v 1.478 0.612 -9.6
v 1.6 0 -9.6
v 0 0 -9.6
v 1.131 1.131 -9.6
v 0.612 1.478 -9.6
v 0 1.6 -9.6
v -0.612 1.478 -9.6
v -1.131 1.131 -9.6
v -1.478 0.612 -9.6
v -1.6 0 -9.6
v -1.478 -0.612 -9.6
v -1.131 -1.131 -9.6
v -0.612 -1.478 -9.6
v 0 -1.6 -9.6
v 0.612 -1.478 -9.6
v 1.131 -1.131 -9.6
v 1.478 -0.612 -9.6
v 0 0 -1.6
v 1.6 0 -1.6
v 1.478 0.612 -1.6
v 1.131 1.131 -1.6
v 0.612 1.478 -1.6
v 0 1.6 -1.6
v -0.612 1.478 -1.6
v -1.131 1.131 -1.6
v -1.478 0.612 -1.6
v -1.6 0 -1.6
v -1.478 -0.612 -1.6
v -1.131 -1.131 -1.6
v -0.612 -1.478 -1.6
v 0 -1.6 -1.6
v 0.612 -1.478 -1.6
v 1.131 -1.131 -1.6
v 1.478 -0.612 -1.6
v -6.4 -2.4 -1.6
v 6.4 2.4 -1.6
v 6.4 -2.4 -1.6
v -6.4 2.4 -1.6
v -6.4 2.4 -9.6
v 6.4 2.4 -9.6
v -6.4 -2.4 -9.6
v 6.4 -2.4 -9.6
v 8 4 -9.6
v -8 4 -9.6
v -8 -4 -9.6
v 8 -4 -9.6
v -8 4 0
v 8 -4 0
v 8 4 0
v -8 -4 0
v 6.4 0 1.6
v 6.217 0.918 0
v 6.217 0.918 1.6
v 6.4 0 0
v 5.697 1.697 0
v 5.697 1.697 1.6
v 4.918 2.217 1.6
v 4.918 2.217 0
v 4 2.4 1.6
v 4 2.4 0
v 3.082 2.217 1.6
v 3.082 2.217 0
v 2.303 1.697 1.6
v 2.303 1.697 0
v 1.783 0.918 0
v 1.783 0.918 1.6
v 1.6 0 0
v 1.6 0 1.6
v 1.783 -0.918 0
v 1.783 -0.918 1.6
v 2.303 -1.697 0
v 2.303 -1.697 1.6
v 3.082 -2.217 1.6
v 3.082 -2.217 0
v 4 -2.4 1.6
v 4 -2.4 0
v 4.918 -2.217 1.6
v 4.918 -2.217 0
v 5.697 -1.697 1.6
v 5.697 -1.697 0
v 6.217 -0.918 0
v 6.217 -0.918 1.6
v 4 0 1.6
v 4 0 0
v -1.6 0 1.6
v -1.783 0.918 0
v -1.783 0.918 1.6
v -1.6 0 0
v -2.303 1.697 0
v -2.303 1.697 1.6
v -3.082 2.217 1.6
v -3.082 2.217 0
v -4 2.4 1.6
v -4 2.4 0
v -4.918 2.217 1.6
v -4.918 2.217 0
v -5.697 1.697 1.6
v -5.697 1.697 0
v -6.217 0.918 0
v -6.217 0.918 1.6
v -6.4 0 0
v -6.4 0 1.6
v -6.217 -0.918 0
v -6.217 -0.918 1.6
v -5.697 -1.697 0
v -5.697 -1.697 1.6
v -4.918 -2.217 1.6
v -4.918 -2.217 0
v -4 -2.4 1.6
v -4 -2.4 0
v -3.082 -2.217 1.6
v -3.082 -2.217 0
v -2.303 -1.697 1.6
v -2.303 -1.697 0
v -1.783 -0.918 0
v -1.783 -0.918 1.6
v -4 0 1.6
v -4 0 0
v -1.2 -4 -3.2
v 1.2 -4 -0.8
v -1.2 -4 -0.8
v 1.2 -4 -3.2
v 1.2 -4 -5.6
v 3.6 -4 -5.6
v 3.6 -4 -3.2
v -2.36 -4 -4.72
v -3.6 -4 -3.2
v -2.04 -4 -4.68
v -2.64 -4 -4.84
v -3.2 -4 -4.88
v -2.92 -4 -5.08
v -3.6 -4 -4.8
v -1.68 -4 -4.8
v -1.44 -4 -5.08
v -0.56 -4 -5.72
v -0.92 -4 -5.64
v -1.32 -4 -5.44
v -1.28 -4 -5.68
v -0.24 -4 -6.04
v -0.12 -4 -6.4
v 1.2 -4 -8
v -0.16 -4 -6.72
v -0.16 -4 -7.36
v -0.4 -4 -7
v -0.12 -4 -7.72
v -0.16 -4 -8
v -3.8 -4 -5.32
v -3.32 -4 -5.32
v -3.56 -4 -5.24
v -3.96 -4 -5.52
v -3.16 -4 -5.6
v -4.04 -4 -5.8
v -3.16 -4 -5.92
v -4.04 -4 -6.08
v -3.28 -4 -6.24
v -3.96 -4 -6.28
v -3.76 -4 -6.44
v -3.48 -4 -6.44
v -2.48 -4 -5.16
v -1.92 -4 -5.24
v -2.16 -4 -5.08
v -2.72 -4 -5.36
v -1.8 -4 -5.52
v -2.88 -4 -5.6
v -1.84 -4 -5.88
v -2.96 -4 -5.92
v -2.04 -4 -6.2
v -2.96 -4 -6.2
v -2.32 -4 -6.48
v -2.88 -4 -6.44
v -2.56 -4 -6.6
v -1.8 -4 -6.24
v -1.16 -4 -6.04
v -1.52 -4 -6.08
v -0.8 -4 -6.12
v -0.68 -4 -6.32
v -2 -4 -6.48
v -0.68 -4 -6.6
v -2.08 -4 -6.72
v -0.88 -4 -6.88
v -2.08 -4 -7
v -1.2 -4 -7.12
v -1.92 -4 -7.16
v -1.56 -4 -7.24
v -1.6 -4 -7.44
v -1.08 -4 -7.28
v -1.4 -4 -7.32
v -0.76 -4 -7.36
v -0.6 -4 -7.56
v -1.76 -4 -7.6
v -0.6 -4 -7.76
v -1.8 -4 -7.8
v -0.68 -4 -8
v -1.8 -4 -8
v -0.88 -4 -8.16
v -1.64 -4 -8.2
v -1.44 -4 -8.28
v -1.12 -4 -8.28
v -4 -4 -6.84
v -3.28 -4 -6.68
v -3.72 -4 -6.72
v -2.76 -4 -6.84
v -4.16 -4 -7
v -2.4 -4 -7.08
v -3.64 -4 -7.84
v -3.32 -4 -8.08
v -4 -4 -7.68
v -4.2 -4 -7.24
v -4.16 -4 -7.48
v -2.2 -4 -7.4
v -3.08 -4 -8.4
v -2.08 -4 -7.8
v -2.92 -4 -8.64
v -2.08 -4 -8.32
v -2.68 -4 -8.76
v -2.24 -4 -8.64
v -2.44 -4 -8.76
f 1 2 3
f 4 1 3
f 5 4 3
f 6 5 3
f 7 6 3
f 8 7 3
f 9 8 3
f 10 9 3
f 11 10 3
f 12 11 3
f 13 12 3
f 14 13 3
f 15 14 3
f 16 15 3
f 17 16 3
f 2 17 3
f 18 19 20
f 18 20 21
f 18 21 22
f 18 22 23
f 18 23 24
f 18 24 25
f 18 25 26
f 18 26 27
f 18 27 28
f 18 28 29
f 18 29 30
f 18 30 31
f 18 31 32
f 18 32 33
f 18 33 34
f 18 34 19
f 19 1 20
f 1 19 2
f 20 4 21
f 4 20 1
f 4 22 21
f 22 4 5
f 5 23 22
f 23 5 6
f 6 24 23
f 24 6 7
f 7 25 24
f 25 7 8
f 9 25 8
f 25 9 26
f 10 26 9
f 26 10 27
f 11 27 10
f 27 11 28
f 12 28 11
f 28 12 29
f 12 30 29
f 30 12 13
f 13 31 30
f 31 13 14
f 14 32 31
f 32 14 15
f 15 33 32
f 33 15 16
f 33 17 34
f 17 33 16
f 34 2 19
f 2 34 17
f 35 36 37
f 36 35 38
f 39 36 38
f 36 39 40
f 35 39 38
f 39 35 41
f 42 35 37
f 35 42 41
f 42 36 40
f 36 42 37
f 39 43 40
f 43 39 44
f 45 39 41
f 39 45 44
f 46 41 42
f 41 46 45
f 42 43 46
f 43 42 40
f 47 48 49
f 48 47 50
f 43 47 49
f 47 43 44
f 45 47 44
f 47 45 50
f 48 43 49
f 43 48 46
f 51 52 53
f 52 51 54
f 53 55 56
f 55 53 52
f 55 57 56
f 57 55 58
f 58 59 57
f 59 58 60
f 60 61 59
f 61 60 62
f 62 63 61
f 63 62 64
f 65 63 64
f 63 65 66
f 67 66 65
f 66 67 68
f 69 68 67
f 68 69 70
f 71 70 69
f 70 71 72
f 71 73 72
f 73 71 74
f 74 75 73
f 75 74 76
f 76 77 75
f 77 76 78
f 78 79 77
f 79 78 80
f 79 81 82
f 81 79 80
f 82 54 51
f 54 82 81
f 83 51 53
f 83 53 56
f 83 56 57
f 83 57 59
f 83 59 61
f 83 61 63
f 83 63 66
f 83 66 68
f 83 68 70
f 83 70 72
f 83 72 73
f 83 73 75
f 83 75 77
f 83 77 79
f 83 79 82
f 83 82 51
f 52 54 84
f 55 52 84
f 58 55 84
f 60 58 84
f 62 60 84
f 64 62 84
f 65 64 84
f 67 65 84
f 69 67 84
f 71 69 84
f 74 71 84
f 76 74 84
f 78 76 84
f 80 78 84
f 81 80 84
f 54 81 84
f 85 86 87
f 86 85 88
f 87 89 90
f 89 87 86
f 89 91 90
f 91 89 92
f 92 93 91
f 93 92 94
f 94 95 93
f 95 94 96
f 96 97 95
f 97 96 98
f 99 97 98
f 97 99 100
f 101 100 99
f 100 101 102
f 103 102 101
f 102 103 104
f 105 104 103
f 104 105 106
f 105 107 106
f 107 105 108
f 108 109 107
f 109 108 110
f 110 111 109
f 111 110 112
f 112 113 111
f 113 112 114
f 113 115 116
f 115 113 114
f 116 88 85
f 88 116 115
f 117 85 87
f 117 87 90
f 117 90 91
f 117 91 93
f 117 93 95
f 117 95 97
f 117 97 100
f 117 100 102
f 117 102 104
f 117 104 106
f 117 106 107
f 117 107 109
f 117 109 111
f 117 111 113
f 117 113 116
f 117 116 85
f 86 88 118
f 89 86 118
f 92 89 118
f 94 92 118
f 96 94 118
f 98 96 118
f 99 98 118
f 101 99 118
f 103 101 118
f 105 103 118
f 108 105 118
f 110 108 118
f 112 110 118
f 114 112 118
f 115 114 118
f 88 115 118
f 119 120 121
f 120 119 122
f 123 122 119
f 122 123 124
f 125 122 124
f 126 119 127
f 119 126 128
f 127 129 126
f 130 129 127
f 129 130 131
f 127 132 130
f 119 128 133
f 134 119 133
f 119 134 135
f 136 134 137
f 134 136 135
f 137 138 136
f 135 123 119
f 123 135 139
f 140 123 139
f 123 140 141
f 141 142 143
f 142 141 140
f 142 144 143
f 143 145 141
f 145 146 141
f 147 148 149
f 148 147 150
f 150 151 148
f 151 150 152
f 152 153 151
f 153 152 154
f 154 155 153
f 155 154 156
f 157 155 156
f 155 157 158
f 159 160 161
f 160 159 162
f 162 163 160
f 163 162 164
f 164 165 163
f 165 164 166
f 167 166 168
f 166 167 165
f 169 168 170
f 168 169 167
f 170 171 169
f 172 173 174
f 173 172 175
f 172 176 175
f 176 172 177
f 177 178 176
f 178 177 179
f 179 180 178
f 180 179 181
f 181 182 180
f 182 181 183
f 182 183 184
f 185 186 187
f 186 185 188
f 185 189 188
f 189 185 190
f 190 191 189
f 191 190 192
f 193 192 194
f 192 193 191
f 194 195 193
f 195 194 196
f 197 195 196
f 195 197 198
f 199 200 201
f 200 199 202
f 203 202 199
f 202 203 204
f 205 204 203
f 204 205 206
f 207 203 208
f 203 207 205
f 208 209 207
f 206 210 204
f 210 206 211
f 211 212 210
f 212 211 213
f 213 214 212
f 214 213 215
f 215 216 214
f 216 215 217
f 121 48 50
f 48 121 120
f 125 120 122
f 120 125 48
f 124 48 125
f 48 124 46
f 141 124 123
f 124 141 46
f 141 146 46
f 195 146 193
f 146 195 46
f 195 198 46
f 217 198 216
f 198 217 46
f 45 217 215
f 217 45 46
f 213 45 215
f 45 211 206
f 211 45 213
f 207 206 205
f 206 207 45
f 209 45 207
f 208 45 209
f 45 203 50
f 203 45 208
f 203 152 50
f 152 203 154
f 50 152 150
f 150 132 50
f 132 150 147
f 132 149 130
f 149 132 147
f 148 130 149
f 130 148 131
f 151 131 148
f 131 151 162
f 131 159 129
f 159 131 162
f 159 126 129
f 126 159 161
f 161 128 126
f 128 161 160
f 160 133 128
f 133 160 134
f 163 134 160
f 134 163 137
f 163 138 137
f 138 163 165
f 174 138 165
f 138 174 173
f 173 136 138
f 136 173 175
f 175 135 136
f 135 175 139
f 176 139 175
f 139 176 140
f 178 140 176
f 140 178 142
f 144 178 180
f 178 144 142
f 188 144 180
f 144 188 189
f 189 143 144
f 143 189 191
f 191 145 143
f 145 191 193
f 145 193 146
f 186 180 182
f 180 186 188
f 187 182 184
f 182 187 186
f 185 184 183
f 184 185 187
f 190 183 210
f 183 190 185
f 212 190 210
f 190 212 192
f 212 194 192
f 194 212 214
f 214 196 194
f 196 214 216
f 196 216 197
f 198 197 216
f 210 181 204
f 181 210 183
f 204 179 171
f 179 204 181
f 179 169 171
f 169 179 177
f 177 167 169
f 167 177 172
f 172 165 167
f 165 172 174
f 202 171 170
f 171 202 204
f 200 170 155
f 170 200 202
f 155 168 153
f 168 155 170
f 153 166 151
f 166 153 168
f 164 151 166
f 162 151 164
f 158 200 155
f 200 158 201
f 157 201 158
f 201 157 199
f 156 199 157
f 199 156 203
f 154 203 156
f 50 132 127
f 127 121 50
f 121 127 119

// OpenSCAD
// file: ../p/4-4edge.scad
use <../lib.scad>
function ldraw_lib__4_4edge() = [
// 0 Circle 1.0
// 0 Name: 4-4edge.dat
// 0 Author: James Jessiman
// 0 !LDRAW_ORG Primitive UPDATE 2017-01
// 0 !LICENSE Licensed under CC BY 2.0 and CC BY 4.0 : see CAreadme.txt
// 
// 0 BFC CERTIFY CCW
  [0,"BFC","CERTIFY"],
  [0,"BFC","CCW"],
// 
// 0 !HISTORY 1998-12-15 [PTadmin] Official Update 1998-10
// 0 !HISTORY 2005-12-28 [PTadmin] Official Update 2005-01
// 0 !HISTORY 2007-06-24 [PTadmin] Header formatted for Contributor Agreement
// 0 !HISTORY 2008-07-01 [PTadmin] Official Update 2008-01
// 0 !HISTORY 2017-01-15 [Steffen] BFCed
// 0 !HISTORY 2017-12-30 [PTadmin] Official Update 2017-01
// 
// 
// 2 24 1 0 0 0.9239 0 0.3827
  [2,24,1,0,0,0.9239,0,0.3827],
// 2 24 0.9239 0 0.3827 0.7071 0 0.7071
  [2,24,0.9239,0,0.3827,0.7071,0,0.7071],
// 2 24 0.7071 0 0.7071 0.3827 0 0.9239
  [2,24,0.7071,0,0.7071,0.3827,0,0.9239],
// 2 24 0.3827 0 0.9239 0 0 1
  [2,24,0.3827,0,0.9239,0,0,1],
// 2 24 0 0 1 -0.3827 0 0.9239
  [2,24,0,0,1,-0.3827,0,0.9239],
// 2 24 -0.3827 0 0.9239 -0.7071 0 0.7071
  [2,24,-0.3827,0,0.9239,-0.7071,0,0.7071],
// 2 24 -0.7071 0 0.7071 -0.9239 0 0.3827
  [2,24,-0.7071,0,0.7071,-0.9239,0,0.3827],
// 2 24 -0.9239 0 0.3827 -1 0 -0
  [2,24,-0.9239,0,0.3827,-1,0,-0],
// 2 24 -1 0 -0 -0.9239 0 -0.3827
  [2,24,-1,0,-0,-0.9239,0,-0.3827],
// 2 24 -0.9239 0 -0.3827 -0.7071 0 -0.7071
  [2,24,-0.9239,0,-0.3827,-0.7071,0,-0.7071],
// 2 24 -0.7071 0 -0.7071 -0.3827 0 -0.9239
  [2,24,-0.7071,0,-0.7071,-0.3827,0,-0.9239],
// 2 24 -0.3827 0 -0.9239 0 0 -1
  [2,24,-0.3827,0,-0.9239,0,0,-1],
// 2 24 0 0 -1 0.3827 0 -0.9239
  [2,24,0,0,-1,0.3827,0,-0.9239],
// 2 24 0.3827 0 -0.9239 0.7071 0 -0.7071
  [2,24,0.3827,0,-0.9239,0.7071,0,-0.7071],
// 2 24 0.7071 0 -0.7071 0.9239 0 -0.3827
  [2,24,0.7071,0,-0.7071,0.9239,0,-0.3827],
// 2 24 0.9239 0 -0.3827 1 0 0
  [2,24,0.9239,0,-0.3827,1,0,0],
];
module ldraw_lib__4_4edge(step=0, col=false, unit=2/5, alt=false, line=0.2, solid=!$preview)
    makepoly(ldraw_lib__4_4edge(), step=step, col=col, unit=unit, alt=alt, line=line, solid=solid);
ldraw_lib__4_4edge(line=0.2);
// file: ../p/4-4disc.scad
use <../lib.scad>
function ldraw_lib__4_4disc() = [
// 0 Disc 1.0
// 0 Name: 4-4disc.dat
// 0 Author: James Jessiman
// 0 !LDRAW_ORG Primitive UPDATE 2002-02
// 0 !LICENSE Licensed under CC BY 2.0 and CC BY 4.0 : see CAreadme.txt
// 
// 0 BFC CERTIFY CCW
  [0,"BFC","CERTIFY"],
  [0,"BFC","CCW"],
// 
// 0 !HISTORY 1998-12-15 [PTadmin] Official Update 1998-10
// 0 !HISTORY 2002-03-23 [sbliss] Added BFC statement
// 0 !HISTORY 2002-04-25 [PTadmin] Official Update 2002-02
// 0 !HISTORY 2007-06-24 [PTadmin] Header formatted for Contributor Agreement
// 0 !HISTORY 2008-07-01 [PTadmin] Official Update 2008-01
// 
// 
// 3 16 0 0 0 1 0 0 0.9239 0 0.3827
  [3,16,0,0,0,1,0,0,0.9239,0,0.3827],
// 3 16 0 0 0 0.9239 0 0.3827 0.7071 0 0.7071
  [3,16,0,0,0,0.9239,0,0.3827,0.7071,0,0.7071],
// 3 16 0 0 0 0.7071 0 0.7071 0.3827 0 0.9239
  [3,16,0,0,0,0.7071,0,0.7071,0.3827,0,0.9239],
// 3 16 0 0 0 0.3827 0 0.9239 0 0 1
  [3,16,0,0,0,0.3827,0,0.9239,0,0,1],
// 3 16 0 0 0 0 0 1 -0.3827 0 0.9239
  [3,16,0,0,0,0,0,1,-0.3827,0,0.9239],
// 3 16 0 0 0 -0.3827 0 0.9239 -0.7071 0 0.7071
  [3,16,0,0,0,-0.3827,0,0.9239,-0.7071,0,0.7071],
// 3 16 0 0 0 -0.7071 0 0.7071 -0.9239 0 0.3827
  [3,16,0,0,0,-0.7071,0,0.7071,-0.9239,0,0.3827],
// 3 16 0 0 0 -0.9239 0 0.3827 -1 0 -0
  [3,16,0,0,0,-0.9239,0,0.3827,-1,0,-0],
// 3 16 0 0 0 -1 0 -0 -0.9239 0 -0.3827
  [3,16,0,0,0,-1,0,-0,-0.9239,0,-0.3827],
// 3 16 0 0 0 -0.9239 0 -0.3827 -0.7071 0 -0.7071
  [3,16,0,0,0,-0.9239,0,-0.3827,-0.7071,0,-0.7071],
// 3 16 0 0 0 -0.7071 0 -0.7071 -0.3827 0 -0.9239
  [3,16,0,0,0,-0.7071,0,-0.7071,-0.3827,0,-0.9239],
// 3 16 0 0 0 -0.3827 0 -0.9239 0 0 -1
  [3,16,0,0,0,-0.3827,0,-0.9239,0,0,-1],
// 3 16 0 0 0 0 0 -1 0.3827 0 -0.9239
  [3,16,0,0,0,0,0,-1,0.3827,0,-0.9239],
// 3 16 0 0 0 0.3827 0 -0.9239 0.7071 0 -0.7071
  [3,16,0,0,0,0.3827,0,-0.9239,0.7071,0,-0.7071],
// 3 16 0 0 0 0.7071 0 -0.7071 0.9239 0 -0.3827
  [3,16,0,0,0,0.7071,0,-0.7071,0.9239,0,-0.3827],
// 3 16 0 0 0 0.9239 0 -0.3827 1 0 0
  [3,16,0,0,0,0.9239,0,-0.3827,1,0,0],
// 0
];
module ldraw_lib__4_4disc(step=0, col=false, unit=2/5, alt=false, line=0.2, solid=!$preview)
    makepoly(ldraw_lib__4_4disc(), step=step, col=col, unit=unit, alt=alt, line=line, solid=solid);
ldraw_lib__4_4disc(line=0.2);
// file: ../p/4-4cyli.scad
use <../lib.scad>
$fa=1; $fs=0.2;
function ldraw_lib__4_4cyli(realsolid=false) = [
// 0 Cylinder 1.0
// 0 Name: 4-4cyli.dat
// 0 Author: James Jessiman
// 0 !LDRAW_ORG Primitive UPDATE 2005-01
// 0 !LICENSE Licensed under CC BY 2.0 and CC BY 4.0 : see CAreadme.txt
// 
// 0 BFC CERTIFY CCW
  [0,"BFC","CERTIFY"],
  [0,"BFC","CCW"],
// 
// 0 !HISTORY 1998-12-15 [PTadmin] Official Update 1998-10
// 0 !HISTORY 2002-03-23 [sbliss] Added BFC statement; merged headers from files in distributions LDraw 0.27 and Complete.
// 0 !HISTORY 2002-04-25 [PTadmin] Official Update 2002-02
// 0 !HISTORY 2004-12-14 [guyvivan] BFC CCW
// 0 !HISTORY 2005-12-28 [PTadmin] Official Update 2005-01
// 0 !HISTORY 2007-06-24 [PTadmin] Header formatted for Contributor Agreement
// 0 !HISTORY 2008-07-01 [PTadmin] Official Update 2008-01
// 
// 
// 4 16 1 1 0 0.9239 1 0.3827 0.9239 0 0.3827 1 0 0
  [4,16,1,1,0,0.9239,1,0.3827,0.9239,0,0.3827,1,0,0],
// 5 24 1 0 0 1 1 0 0.9239 0 0.3827 0.9239 0 -0.3827
  [5,24,1,0,0,1,1,0,0.9239,0,0.3827,0.9239,0,-0.3827],
// 4 16 0.9239 1 0.3827 0.7071 1 0.7071 0.7071 0 0.7071 0.9239 0 0.3827
  [4,16,0.9239,1,0.3827,0.7071,1,0.7071,0.7071,0,0.7071,0.9239,0,0.3827],
// 5 24 0.9239 0 0.3827 0.9239 1 0.3827 0.7071 0 0.7071 1 0 0
  [5,24,0.9239,0,0.3827,0.9239,1,0.3827,0.7071,0,0.7071,1,0,0],
// 4 16 0.7071 1 0.7071 0.3827 1 0.9239 0.3827 0 0.9239 0.7071 0 0.7071
  [4,16,0.7071,1,0.7071,0.3827,1,0.9239,0.3827,0,0.9239,0.7071,0,0.7071],
// 5 24 0.7071 0 0.7071 0.7071 1 0.7071 0.3827 0 0.9239 0.9239 0 0.3827
  [5,24,0.7071,0,0.7071,0.7071,1,0.7071,0.3827,0,0.9239,0.9239,0,0.3827],
// 4 16 0.3827 1 0.9239 0 1 1 0 0 1 0.3827 0 0.9239
  [4,16,0.3827,1,0.9239,0,1,1,0,0,1,0.3827,0,0.9239],
// 5 24 0.3827 0 0.9239 0.3827 1 0.9239 0 0 1 0.7071 0 0.7071
  [5,24,0.3827,0,0.9239,0.3827,1,0.9239,0,0,1,0.7071,0,0.7071],
// 4 16 0 1 1 -0.3827 1 0.9239 -0.3827 0 0.9239 0 0 1
  [4,16,0,1,1,-0.3827,1,0.9239,-0.3827,0,0.9239,0,0,1],
// 5 24 0 0 1 0 1 1 -0.3827 0 0.9239 0.3827 0 0.9239
  [5,24,0,0,1,0,1,1,-0.3827,0,0.9239,0.3827,0,0.9239],
// 4 16 -0.3827 1 0.9239 -0.7071 1 0.7071 -0.7071 0 0.7071 -0.3827 0 0.9239
  [4,16,-0.3827,1,0.9239,-0.7071,1,0.7071,-0.7071,0,0.7071,-0.3827,0,0.9239],
// 5 24 -0.3827 0 0.9239 -0.3827 1 0.9239 -0.7071 0 0.7071 0 0 1
  [5,24,-0.3827,0,0.9239,-0.3827,1,0.9239,-0.7071,0,0.7071,0,0,1],
// 4 16 -0.7071 1 0.7071 -0.9239 1 0.3827 -0.9239 0 0.3827 -0.7071 0 0.7071
  [4,16,-0.7071,1,0.7071,-0.9239,1,0.3827,-0.9239,0,0.3827,-0.7071,0,0.7071],
// 5 24 -0.7071 0 0.7071 -0.7071 1 0.7071 -0.9239 0 0.3827 -0.3827 0 0.9239
  [5,24,-0.7071,0,0.7071,-0.7071,1,0.7071,-0.9239,0,0.3827,-0.3827,0,0.9239],
// 4 16 -0.9239 1 0.3827 -1 1 0 -1 0 0 -0.9239 0 0.3827
  [4,16,-0.9239,1,0.3827,-1,1,0,-1,0,0,-0.9239,0,0.3827],
// 5 24 -0.9239 0 0.3827 -0.9239 1 0.3827 -1 0 0 -0.7071 0 0.7071
  [5,24,-0.9239,0,0.3827,-0.9239,1,0.3827,-1,0,0,-0.7071,0,0.7071],
// 4 16 -1 1 0 -0.9239 1 -0.3827 -0.9239 0 -0.3827 -1 0 0
  [4,16,-1,1,0,-0.9239,1,-0.3827,-0.9239,0,-0.3827,-1,0,0],
// 5 24 -1 0 0 -1 1 0 -0.9239 0 -0.3827 -0.9239 0 0.3827
  [5,24,-1,0,0,-1,1,0,-0.9239,0,-0.3827,-0.9239,0,0.3827],
// 4 16 -0.9239 1 -0.3827 -0.7071 1 -0.7071 -0.7071 0 -0.7071 -0.9239 0 -0.3827
  [4,16,-0.9239,1,-0.3827,-0.7071,1,-0.7071,-0.7071,0,-0.7071,-0.9239,0,-0.3827],
// 5 24 -0.9239 0 -0.3827 -0.9239 1 -0.3827 -0.7071 0 -0.7071 -1 0 0
  [5,24,-0.9239,0,-0.3827,-0.9239,1,-0.3827,-0.7071,0,-0.7071,-1,0,0],
// 4 16 -0.7071 1 -0.7071 -0.3827 1 -0.9239 -0.3827 0 -0.9239 -0.7071 0 -0.7071
  [4,16,-0.7071,1,-0.7071,-0.3827,1,-0.9239,-0.3827,0,-0.9239,-0.7071,0,-0.7071],
// 5 24 -0.7071 0 -0.7071 -0.7071 1 -0.7071 -0.3827 0 -0.9239 -0.9239 0 -0.3827
  [5,24,-0.7071,0,-0.7071,-0.7071,1,-0.7071,-0.3827,0,-0.9239,-0.9239,0,-0.3827],
// 4 16 -0.3827 1 -0.9239 0 1 -1 0 0 -1 -0.3827 0 -0.9239
  [4,16,-0.3827,1,-0.9239,0,1,-1,0,0,-1,-0.3827,0,-0.9239],
// 5 24 -0.3827 0 -0.9239 -0.3827 1 -0.9239 0 0 -1 -0.7071 0 -0.7071
  [5,24,-0.3827,0,-0.9239,-0.3827,1,-0.9239,0,0,-1,-0.7071,0,-0.7071],
// 4 16 0 1 -1 0.3827 1 -0.9239 0.3827 0 -0.9239 0 0 -1
  [4,16,0,1,-1,0.3827,1,-0.9239,0.3827,0,-0.9239,0,0,-1],
// 5 24 0 0 -1 0 1 -1 0.3827 0 -0.9239 -0.3827 0 -0.9239
  [5,24,0,0,-1,0,1,-1,0.3827,0,-0.9239,-0.3827,0,-0.9239],
// 4 16 0.3827 1 -0.9239 0.7071 1 -0.7071 0.7071 0 -0.7071 0.3827 0 -0.9239
  [4,16,0.3827,1,-0.9239,0.7071,1,-0.7071,0.7071,0,-0.7071,0.3827,0,-0.9239],
// 5 24 0.3827 0 -0.9239 0.3827 1 -0.9239 0.7071 0 -0.7071 0 0 -1
  [5,24,0.3827,0,-0.9239,0.3827,1,-0.9239,0.7071,0,-0.7071,0,0,-1],
// 4 16 0.7071 1 -0.7071 0.9239 1 -0.3827 0.9239 0 -0.3827 0.7071 0 -0.7071
  [4,16,0.7071,1,-0.7071,0.9239,1,-0.3827,0.9239,0,-0.3827,0.7071,0,-0.7071],
// 5 24 0.7071 0 -0.7071 0.7071 1 -0.7071 0.9239 0 -0.3827 0.3827 0 -0.9239
  [5,24,0.7071,0,-0.7071,0.7071,1,-0.7071,0.9239,0,-0.3827,0.3827,0,-0.9239],
// 4 16 0.9239 1 -0.3827 1 1 0 1 0 0 0.9239 0 -0.3827
  [4,16,0.9239,1,-0.3827,1,1,0,1,0,0,0.9239,0,-0.3827],
// 5 24 0.9239 0 -0.3827 0.9239 1 -0.3827 1 0 0 0.7071 0 -0.7071
  [5,24,0.9239,0,-0.3827,0.9239,1,-0.3827,1,0,0,0.7071,0,-0.7071],
// 0
];
module ldraw_lib__4_4cyli(step=0, col=false, unit=2/5, alt=false, line=0.2, solid=!$preview)
    makepoly(ldraw_lib__4_4cyli(solid), step=step, col=col, unit=unit, alt=alt, line=line, solid=solid);
ldraw_lib__4_4cyli(line=0.2);
// file: ../p/stud3.scad
use <../lib.scad>
use <4-4cyli.scad>
use <4-4disc.scad>
use <4-4edge.scad>
function ldraw_lib__stud3() = [
// 0 Stud Tube Solid
// 0 Name: stud3.dat
// 0 Author: James Jessiman
// 0 !LDRAW_ORG Primitive UPDATE 2012-01
// 0 !LICENSE Licensed under CC BY 4.0 : see CAreadme.txt
// 
// 0 BFC CERTIFY CCW
  [0,"BFC","CERTIFY"],
  [0,"BFC","CCW"],
// 
// 0 !HISTORY 2002-04-04 [sbliss] Modified for BFC compliance
// 0 !HISTORY 2002-04-25 [PTadmin] Official Update 2002-02
// 0 !HISTORY 2007-06-24 [PTadmin] Header formatted for Contributor Agreement
// 0 !HISTORY 2008-07-01 [PTadmin] Official Update 2008-01
// 0 !HISTORY 2012-02-16 [Philo] Changed to CCW
// 0 !HISTORY 2012-03-30 [PTadmin] Official Update 2012-01
// 
// 
// 1 16 0 -4 0 4 0 0 0 1 0 0 0 4 4-4edge.dat
  [1,16,0,-4,0,4,0,0,0,1,0,0,0,4, ldraw_lib__4_4edge()],
// 1 16 0 0 0 4 0 0 0 1 0 0 0 4 4-4edge.dat
  [1,16,0,0,0,4,0,0,0,1,0,0,0,4, ldraw_lib__4_4edge()],
// 1 16 0 -4 0 4 0 0 0 1 0 0 0 4 4-4disc.dat
  [1,16,0,-4,0,4,0,0,0,1,0,0,0,4, ldraw_lib__4_4disc()],
  [-1,16,0,0,0,4,0,0,0,-1,0,0,0,4, ldraw_lib__4_4disc()],
// 1 16 0 -4 0 4 0 0 0 4 0 0 0 4 4-4cyli.dat
  [1,16,0,-4,0,4,0,0,0,4,0,0,0,4, ldraw_lib__4_4cyli()],
];
module ldraw_lib__stud3(step=0, col=false, unit=2/5, alt=false, line=0.2, solid=!$preview)
    makepoly(ldraw_lib__stud3(), step=step, col=col, unit=unit, alt=alt, line=line, solid=solid);
ldraw_lib__stud3(line=0.2);
// file: ../p/stud.scad
use <../lib.scad>
use <4-4cyli.scad>
use <4-4disc.scad>
use <4-4edge.scad>
function ldraw_lib__stud() = [
// 0 Stud
// 0 Name: stud.dat
// 0 Author: James Jessiman
// 0 !LDRAW_ORG Primitive UPDATE 2012-01
// 0 !LICENSE Licensed under CC BY 4.0 : see CAreadme.txt
// 
// 0 BFC CERTIFY CCW
  [0,"BFC","CERTIFY"],
  [0,"BFC","CCW"],
// 
// 0 !HISTORY 2002-04-04 [sbliss] Modified for BFC compliance
// 0 !HISTORY 2002-04-25 [PTadmin] Official Update 2002-02
// 0 !HISTORY 2007-06-24 [PTadmin] Header formatted for Contributor Agreement
// 0 !HISTORY 2008-07-01 [PTadmin] Official Update 2008-01
// 0 !HISTORY 2012-02-16 [Philo] Changed to CCW
// 0 !HISTORY 2012-03-30 [PTadmin] Official Update 2012-01
// 
// 
// 1 16 0 0 0 6 0 0 0 1 0 0 0 6 4-4edge.dat
  [1,16,0,0,0,6,0,0,0,1,0,0,0,6, ldraw_lib__4_4edge()],
// 1 16 0 -4 0 6 0 0 0 1 0 0 0 6 4-4edge.dat
  [1,16,0,-4,0,6,0,0,0,1,0,0,0,6, ldraw_lib__4_4edge()],
// 1 16 0 0 0 6 0 0 0 -4 0 0 0 6 4-4cyli.dat
  [1,16,0,0,0,6,0,0,0,-4,0,0,0,6, ldraw_lib__4_4cyli()],
// 1 16 0 -4 0 6 0 0 0 1 0 0 0 6 4-4disc.dat
  [1,16,0,-4,0,6,0,0,0,1,0,0,0,6, ldraw_lib__4_4disc()],
  [-1,16,0,0,0,6,0,0,0,-1,0,0,0,6, ldraw_lib__4_4disc()],
];
module ldraw_lib__stud(step=0, col=false, unit=2/5, alt=false, line=0.2, solid=!$preview)
    makepoly(ldraw_lib__stud(), step=step, col=col, unit=unit, alt=alt, line=line, solid=solid);
ldraw_lib__stud(line=0.2);
// file: ../p/box5.scad
use <../lib.scad>
function ldraw_lib__box5() = [
// 0 Box with 5 Faces and All Edges
// 0 Name: box5.dat
// 0 Author: James Jessiman
// 0 !LDRAW_ORG Primitive UPDATE 2012-01
// 0 !LICENSE Licensed under CC BY 2.0 and CC BY 4.0 : see CAreadme.txt
// 
// 0 BFC CERTIFY CCW
  [0,"BFC","CERTIFY"],
  [0,"BFC","CCW"],
// 
// 0 !HISTORY 2002-04-03 [sbliss] Modified for BFC compliance
// 0 !HISTORY 2002-04-25 [PTadmin] Official Update 2002-02
// 0 !HISTORY 2007-06-24 [PTadmin] Header formatted for Contributor Agreement
// 0 !HISTORY 2008-07-01 [PTadmin] Official Update 2008-01
// 0 !HISTORY 2012-02-16 [Philo] Changed to CCW
// 0 !HISTORY 2012-03-30 [PTadmin] Official Update 2012-01
// 
// 
// 2 24 1 1 1 -1 1 1
  [2,24,1,1,1,-1,1,1],
// 2 24 -1 1 1 -1 1 -1
  [2,24,-1,1,1,-1,1,-1],
// 2 24 -1 1 -1 1 1 -1
  [2,24,-1,1,-1,1,1,-1],
// 2 24 1 1 -1 1 1 1
  [2,24,1,1,-1,1,1,1],
// 2 24 1 0 1 -1 0 1
  [2,24,1,0,1,-1,0,1],
// 2 24 -1 0 1 -1 0 -1
  [2,24,-1,0,1,-1,0,-1],
// 2 24 -1 0 -1 1 0 -1
  [2,24,-1,0,-1,1,0,-1],
// 2 24 1 0 -1 1 0 1
  [2,24,1,0,-1,1,0,1],
// 2 24 1 0 1 1 1 1
  [2,24,1,0,1,1,1,1],
// 2 24 -1 0 1 -1 1 1
  [2,24,-1,0,1,-1,1,1],
// 2 24 1 0 -1 1 1 -1
  [2,24,1,0,-1,1,1,-1],
// 2 24 -1 0 -1 -1 1 -1
  [2,24,-1,0,-1,-1,1,-1],
// 4 16 -1 1 1 1 1 1 1 1 -1 -1 1 -1
  [4,16,-1,1,1,1,1,1,1,1,-1,-1,1,-1],
// 4 16 -1 1 1 -1 0 1 1 0 1 1 1 1
  [4,16,-1,1,1,-1,0,1,1,0,1,1,1,1],
// 4 16 -1 1 -1 -1 0 -1 -1 0 1 -1 1 1
  [4,16,-1,1,-1,-1,0,-1,-1,0,1,-1,1,1],
// 4 16 1 1 -1 1 0 -1 -1 0 -1 -1 1 -1
  [4,16,1,1,-1,1,0,-1,-1,0,-1,-1,1,-1],
// 4 16 1 1 1 1 0 1 1 0 -1 1 1 -1
  [4,16,1,1,1,1,0,1,1,0,-1,1,1,-1],
];
makepoly(ldraw_lib__box5(), line=0.2);
// file: ../p/box4t.scad
use <../lib.scad>
function ldraw_lib__box4t() = [
// 0 Box with 4 Adjacent Faces and All Edges
// 0 Name: box4t.dat
// 0 Author: Tore Eriksson [Tore_Eriksson]
// 0 !LDRAW_ORG Primitive UPDATE 2003-02
// 0 !LICENSE Licensed under CC BY 2.0 and CC BY 4.0 : see CAreadme.txt
// 
// 0 BFC CERTIFY CCW
  [0,"BFC","CERTIFY"],
  [0,"BFC","CCW"],
// 
// 0 !HISTORY 1997-09-29 [PTadmin] Official Update 1997-15
// 0 !HISTORY 2002-08-31 [izanette] Modified with WINDZ for BFC compliance
// 0 !HISTORY 2003-08-01 [PTadmin] Official Update 2003-02
// 0 !HISTORY 2007-06-24 [PTadmin] Header formatted for Contributor Agreement
// 0 !HISTORY 2008-07-01 [PTadmin] Official Update 2008-01
// 
// 
// 2 24 1 1 1 -1 1 1
  [2,24,1,1,1,-1,1,1],
// 2 24 -1 1 1 -1 1 -1
  [2,24,-1,1,1,-1,1,-1],
// 2 24 -1 1 -1 1 1 -1
  [2,24,-1,1,-1,1,1,-1],
// 2 24 1 1 -1 1 1 1
  [2,24,1,1,-1,1,1,1],
// 2 24 1 0 1 -1 0 1
  [2,24,1,0,1,-1,0,1],
// 2 24 -1 0 1 -1 0 -1
  [2,24,-1,0,1,-1,0,-1],
// 2 24 -1 0 -1 1 0 -1
  [2,24,-1,0,-1,1,0,-1],
// 2 24 1 0 -1 1 0 1
  [2,24,1,0,-1,1,0,1],
// 2 24 1 0 1 1 1 1
  [2,24,1,0,1,1,1,1],
// 2 24 -1 0 1 -1 1 1
  [2,24,-1,0,1,-1,1,1],
// 2 24 1 0 -1 1 1 -1
  [2,24,1,0,-1,1,1,-1],
// 2 24 -1 0 -1 -1 1 -1
  [2,24,-1,0,-1,-1,1,-1],
// 4 16 1 1 1 1 1 -1 -1 1 -1 -1 1 1
  [4,16,1,1,1,1,1,-1,-1,1,-1,-1,1,1],
// 4 16 1 1 1 -1 1 1 -1 0 1 1 0 1
  [4,16,1,1,1,-1,1,1,-1,0,1,1,0,1],
// 4 16 -1 1 1 -1 1 -1 -1 0 -1 -1 0 1
  [4,16,-1,1,1,-1,1,-1,-1,0,-1,-1,0,1],
// 0 4 16 -1 1 -1 -1 0 -1 1 0 -1 1 1 -1
// 4 16 1 1 -1 1 1 1 1 0 1 1 0 -1
  [4,16,1,1,-1,1,1,1,1,0,1,1,0,-1],
// 0
];
makepoly(ldraw_lib__box4t(), line=0.2);
// file: s/3004s01.scad
use <../../lib.scad>
use <../../p/box4t.scad>
use <../../p/box5.scad>
use <../../p/stud.scad>
use <../../p/stud3.scad>
$fa=1; $fs=0.2;
function ldraw_lib__s__3004s01(realsolid=false) = [
// 0 ~Brick  1 x  2 without Front Face
// 0 Name: s\3004s01.dat
// 0 Author: James Jessiman
// 0 !LDRAW_ORG Subpart UPDATE 2003-03
// 0 !LICENSE Licensed under CC BY 2.0 and CC BY 4.0 : see CAreadme.txt
// 
// 0 BFC CERTIFY CCW
  [0,"BFC","CERTIFY"],
  [0,"BFC","CCW"],
// 
// 0 !HISTORY 2003-09-07 [jriley] Subfiling, BFC
// 0 !HISTORY 2003-12-19 [PTadmin] Official Update 2003-03
// 0 !HISTORY 2007-08-29 [PTadmin] Header formatted for Contributor Agreement
// 0 !HISTORY 2008-07-01 [PTadmin] Official Update 2008-01
// 
// 
// 1 16 0 4 0 1 0 0 0 -5 0 0 0 1 stud3.dat
  [1,16,0,4,0,1,0,0,0,-5,0,0,0,1, ldraw_lib__stud3(realsolid)],
// 0 BFC INVERTNEXT
  [0,"BFC","INVERTNEXT"],
// 1 16 0 24 0 16 0 0 0 -20 0 0 0 6 box5.dat
  [1,16,0,24,0,16,0,0,0,-20,0,0,0,6, ldraw_lib__box5(realsolid)],
// 4 16 20 24 10 16 24 6 -16 24 6 -20 24 10
  [4,16,20,24,10,16,24,6,-16,24,6,-20,24,10],
// 4 16 -20 24 10 -16 24 6 -16 24 -6 -20 24 -10
  [4,16,-20,24,10,-16,24,6,-16,24,-6,-20,24,-10],
// 4 16 -20 24 -10 -16 24 -6 16 24 -6 20 24 -10
  [4,16,-20,24,-10,-16,24,-6,16,24,-6,20,24,-10],
// 4 16 20 24 -10 16 24 -6 16 24 6 20 24 10
  [4,16,20,24,-10,16,24,-6,16,24,6,20,24,10],
// 1 16 0 24 0 20 0 0 0 -24 0 0 0 10 box4t.dat
  [1,16,0,24,0,20,0,0,0,-24,0,0,0,10, ldraw_lib__box4t(realsolid)],
// 1 16 10 0 0 1 0 0 0 1 0 0 0 1 stud.dat
  [1,16,10,0,0,1,0,0,0,1,0,0,0,1, ldraw_lib__stud(realsolid)],
// 1 16 -10 0 0 1 0 0 0 1 0 0 0 1 stud.dat
  [1,16,-10,0,0,1,0,0,0,1,0,0,0,1, ldraw_lib__stud(realsolid)],
// 0
];
module ldraw_lib__s__3004s01(step=0, col=false, unit=2/5, alt=false, line=0.2, solid=!$preview)
    makepoly(ldraw_lib__s__3004s01(solid), step=step, col=col, unit=unit, alt=alt, line=line, solid=solid);
ldraw_lib__s__3004s01(line=0.2);
// main file
use <../lib.scad>
use <s/3004s01.scad>
function ldraw_lib__3004pf0() = [
// 0 Brick  1 x  2 with Magenta Cross and Animal Paw Pattern
// 0 Name: 3004pf0.dat
// 0 Author: Takeshi Takahashi [RainbowDolphin]
// 0 !LDRAW_ORG Part UPDATE 2025-06
// 0 !LICENSE Licensed under CC BY 4.0 : see CAreadme.txt
// 
// 0 BFC CERTIFY CCW
  [0,"BFC","CERTIFY"],
  [0,"BFC","CCW"],
// 
// 0 !KEYWORDS Bricklink 3004pb126, Friends, Rebrickable 3004pr0015, Set 41086
// 0 !KEYWORDS Set 41125, Vet
// 
// 0 !HISTORY 2025-06-26 [OrionP] Official Update 2025-06
// 
// 1 16 0 0 0 1 0 0 0 1 0 0 0 1 s\3004s01.dat
  [1,16,0,0,0,1,0,0,0,1,0,0,0,1, ldraw_lib__s__3004s01()],
// 4 26 3 2 -10 -3 2 -10 -3 8 -10 3 8 -10
  [4,26,3,2,-10,-3,2,-10,-3,8,-10,3,8,-10],
// 4 26 3 8 -10 -3 8 -10 3 14 -10 9 14 -10
  [4,26,3,8,-10,-3,8,-10,3,14,-10,9,14,-10],
// 3 26 9 8 -10 3 8 -10 9 14 -10
  [3,26,9,8,-10,3,8,-10,9,14,-10],
// 4 26 -5.1 11.7 -10 -3 8 -10 -9 8 -10 -5.9 11.8 -10
  [4,26,-5.1,11.7,-10,-3,8,-10,-9,8,-10,-5.9,11.8,-10],
// 3 26 -9 8 -10 -6.6 12.1 -10 -5.9 11.8 -10
  [3,26,-9,8,-10,-6.6,12.1,-10,-5.9,11.8,-10],
// 4 26 -7.3 12.7 -10 -6.6 12.1 -10 -9 8 -10 -8 12.2 -10
  [4,26,-7.3,12.7,-10,-6.6,12.1,-10,-9,8,-10,-8,12.2,-10],
// 3 26 -9 8 -10 -9 12 -10 -8 12.2 -10
  [3,26,-9,8,-10,-9,12,-10,-8,12.2,-10],
// 3 26 -3 8 -10 -5.1 11.7 -10 -4.2 12 -10
  [3,26,-3,8,-10,-5.1,11.7,-10,-4.2,12,-10],
// 4 26 -3 8 -10 -4.2 12 -10 -3.6 12.7 -10 -1.4 14.3 -10
  [4,26,-3,8,-10,-4.2,12,-10,-3.6,12.7,-10,-1.4,14.3,-10],
// 4 26 -2.3 14.1 -10 -1.4 14.3 -10 -3.6 12.7 -10 -3.3 13.6 -10
  [4,26,-2.3,14.1,-10,-1.4,14.3,-10,-3.6,12.7,-10,-3.3,13.6,-10],
// 3 26 -3.3 13.6 -10 -3.2 14.2 -10 -2.3 14.1 -10
  [3,26,-3.3,13.6,-10,-3.2,14.2,-10,-2.3,14.1,-10],
// 4 26 3 14 -10 -3 8 -10 -1.4 14.3 -10 -0.6 15.1 -10
  [4,26,3,14,-10,-3,8,-10,-1.4,14.3,-10,-0.6,15.1,-10],
// 4 26 3 14 -10 -0.6 15.1 -10 -0.3 16 -10 3 20 -10
  [4,26,3,14,-10,-0.6,15.1,-10,-0.3,16,-10,3,20,-10],
// 4 26 3 20 -10 -0.3 16 -10 -0.4 16.8 -10 -0.4 18.4 -10
  [4,26,3,20,-10,-0.3,16,-10,-0.4,16.8,-10,-0.4,18.4,-10],
// 3 26 -0.4 16.8 -10 -1 17.5 -10 -0.4 18.4 -10
  [3,26,-0.4,16.8,-10,-1,17.5,-10,-0.4,18.4,-10],
// 3 26 -0.4 18.4 -10 -0.3 19.3 -10 3 20 -10
  [3,26,-0.4,18.4,-10,-0.3,19.3,-10,3,20,-10],
// 3 26 -0.3 19.3 -10 -0.4 20 -10 3 20 -10
  [3,26,-0.3,19.3,-10,-0.4,20,-10,3,20,-10],
// 4 321 -8.3 13.3 -10 -8.9 13.1 -10 -9.5 13.3 -10 -9.9 13.8 -10
  [4,321,-8.3,13.3,-10,-8.9,13.1,-10,-9.5,13.3,-10,-9.9,13.8,-10],
// 4 321 -7.9 14 -10 -8.3 13.3 -10 -9.9 13.8 -10 -10.1 14.5 -10
  [4,321,-7.9,14,-10,-8.3,13.3,-10,-9.9,13.8,-10,-10.1,14.5,-10],
// 4 321 -7.9 14.8 -10 -7.9 14 -10 -10.1 14.5 -10 -10.1 15.2 -10
  [4,321,-7.9,14.8,-10,-7.9,14,-10,-10.1,14.5,-10,-10.1,15.2,-10],
// 4 321 -8.2 15.6 -10 -7.9 14.8 -10 -10.1 15.2 -10 -9.9 15.7 -10
  [4,321,-8.2,15.6,-10,-7.9,14.8,-10,-10.1,15.2,-10,-9.9,15.7,-10],
// 4 321 -8.7 16.1 -10 -8.2 15.6 -10 -9.9 15.7 -10 -9.4 16.1 -10
  [4,321,-8.7,16.1,-10,-8.2,15.6,-10,-9.9,15.7,-10,-9.4,16.1,-10],
// 4 321 -4.8 13.1 -10 -5.4 12.7 -10 -6.2 12.9 -10 -6.8 13.4 -10
  [4,321,-4.8,13.1,-10,-5.4,12.7,-10,-6.2,12.9,-10,-6.8,13.4,-10],
// 4 321 -4.5 13.8 -10 -4.8 13.1 -10 -6.8 13.4 -10 -7.2 14 -10
  [4,321,-4.5,13.8,-10,-4.8,13.1,-10,-6.8,13.4,-10,-7.2,14,-10],
// 4 321 -4.6 14.7 -10 -4.5 13.8 -10 -7.2 14 -10 -7.4 14.8 -10
  [4,321,-4.6,14.7,-10,-4.5,13.8,-10,-7.2,14,-10,-7.4,14.8,-10],
// 4 321 -5.1 15.5 -10 -4.6 14.7 -10 -7.4 14.8 -10 -7.4 15.5 -10
  [4,321,-5.1,15.5,-10,-4.6,14.7,-10,-7.4,14.8,-10,-7.4,15.5,-10],
// 4 321 -5.8 16.2 -10 -5.1 15.5 -10 -7.4 15.5 -10 -7.2 16.1 -10
  [4,321,-5.8,16.2,-10,-5.1,15.5,-10,-7.4,15.5,-10,-7.2,16.1,-10],
// 3 321 -7.2 16.1 -10 -6.4 16.5 -10 -5.8 16.2 -10
  [3,321,-7.2,16.1,-10,-6.4,16.5,-10,-5.8,16.2,-10],
// 4 321 -2 15.3 -10 -2.9 15.1 -10 -3.8 15.2 -10 -4.5 15.6 -10
  [4,321,-2,15.3,-10,-2.9,15.1,-10,-3.8,15.2,-10,-4.5,15.6,-10],
// 4 321 -1.7 15.8 -10 -2 15.3 -10 -4.5 15.6 -10 -5 16.2 -10
  [4,321,-1.7,15.8,-10,-2,15.3,-10,-4.5,15.6,-10,-5,16.2,-10],
// 4 321 -1.7 16.5 -10 -1.7 15.8 -10 -5 16.2 -10 -5.2 16.8 -10
  [4,321,-1.7,16.5,-10,-1.7,15.8,-10,-5,16.2,-10,-5.2,16.8,-10],
// 4 321 -2.2 17.2 -10 -1.7 16.5 -10 -5.2 16.8 -10 -5.2 17.5 -10
  [4,321,-2.2,17.2,-10,-1.7,16.5,-10,-5.2,16.8,-10,-5.2,17.5,-10],
// 4 321 -3 17.8 -10 -2.2 17.2 -10 -5.2 17.5 -10 -4.8 17.9 -10
  [4,321,-3,17.8,-10,-2.2,17.2,-10,-5.2,17.5,-10,-4.8,17.9,-10],
// 3 321 -3 17.8 -10 -4.8 17.9 -10 -3.9 18.1 -10
  [3,321,-3,17.8,-10,-4.8,17.9,-10,-3.9,18.1,-10],
// 4 321 -1.9 18.4 -10 -2.7 18.2 -10 -3.5 18.3 -10 -4 18.6 -10
  [4,321,-1.9,18.4,-10,-2.7,18.2,-10,-3.5,18.3,-10,-4,18.6,-10],
// 4 321 -1.5 18.9 -10 -1.9 18.4 -10 -4 18.6 -10 -4.4 19 -10
  [4,321,-1.5,18.9,-10,-1.9,18.4,-10,-4,18.6,-10,-4.4,19,-10],
// 4 321 -1.5 19.4 -10 -1.5 18.9 -10 -4.4 19 -10 -4.5 19.5 -10
  [4,321,-1.5,19.4,-10,-1.5,18.9,-10,-4.4,19,-10,-4.5,19.5,-10],
// 4 321 -1.7 20 -10 -1.5 19.4 -10 -4.5 19.5 -10 -4.5 20 -10
  [4,321,-1.7,20,-10,-1.5,19.4,-10,-4.5,19.5,-10,-4.5,20,-10],
// 4 321 -2.2 20.4 -10 -1.7 20 -10 -4.5 20 -10 -4.1 20.5 -10
  [4,321,-2.2,20.4,-10,-1.7,20,-10,-4.5,20,-10,-4.1,20.5,-10],
// 4 321 -2.8 20.7 -10 -2.2 20.4 -10 -4.1 20.5 -10 -3.6 20.7 -10
  [4,321,-2.8,20.7,-10,-2.2,20.4,-10,-4.1,20.5,-10,-3.6,20.7,-10],
// 4 321 -6.9 17.1 -10 -8.2 16.7 -10 -9.3 16.8 -10 -10 17.1 -10
  [4,321,-6.9,17.1,-10,-8.2,16.7,-10,-9.3,16.8,-10,-10,17.1,-10],
// 4 321 -6 17.7 -10 -6.9 17.1 -10 -10 17.1 -10 -10.4 17.5 -10
  [4,321,-6,17.7,-10,-6.9,17.1,-10,-10,17.1,-10,-10.4,17.5,-10],
// 4 321 -8.3 20.2 -10 -6 17.7 -10 -10.4 17.5 -10 -9.1 19.6 -10
  [4,321,-8.3,20.2,-10,-6,17.7,-10,-10.4,17.5,-10,-9.1,19.6,-10],
// 4 321 -9.1 19.6 -10 -10.4 17.5 -10 -10.5 18.1 -10 -10 19.2 -10
  [4,321,-9.1,19.6,-10,-10.4,17.5,-10,-10.5,18.1,-10,-10,19.2,-10],
// 3 321 -10.5 18.1 -10 -10.4 18.7 -10 -10 19.2 -10
  [3,321,-10.5,18.1,-10,-10.4,18.7,-10,-10,19.2,-10],
// 4 321 -5.5 18.5 -10 -6 17.7 -10 -8.3 20.2 -10 -7.7 21 -10
  [4,321,-5.5,18.5,-10,-6,17.7,-10,-8.3,20.2,-10,-7.7,21,-10],
// 4 321 -5.2 19.5 -10 -5.5 18.5 -10 -7.7 21 -10 -7.3 21.6 -10
  [4,321,-5.2,19.5,-10,-5.5,18.5,-10,-7.7,21,-10,-7.3,21.6,-10],
// 4 321 -5.2 20.8 -10 -5.2 19.5 -10 -7.3 21.6 -10 -6.7 21.9 -10
  [4,321,-5.2,20.8,-10,-5.2,19.5,-10,-7.3,21.6,-10,-6.7,21.9,-10],
// 4 321 -5.6 21.6 -10 -5.2 20.8 -10 -6.7 21.9 -10 -6.1 21.9 -10
  [4,321,-5.6,21.6,-10,-5.2,20.8,-10,-6.7,21.9,-10,-6.1,21.9,-10],
// 4 16 20 0 -10 -20 0 -10 -3 2 -10 3 2 -10
  [4,16,20,0,-10,-20,0,-10,-3,2,-10,3,2,-10],
// 4 16 20 0 -10 3 2 -10 3 8 -10 9 8 -10
  [4,16,20,0,-10,3,2,-10,3,8,-10,9,8,-10],
// 4 16 20 0 -10 9 8 -10 9 14 -10 20 24 -10
  [4,16,20,0,-10,9,8,-10,9,14,-10,20,24,-10],
// 4 16 20 24 -10 9 14 -10 3 14 -10 3 20 -10
  [4,16,20,24,-10,9,14,-10,3,14,-10,3,20,-10],
// 3 16 3 20 -10 -0.4 20 -10 20 24 -10
  [3,16,3,20,-10,-0.4,20,-10,20,24,-10],
// 4 16 20 24 -10 -0.4 20 -10 -1.7 20 -10 -2.2 20.4 -10
  [4,16,20,24,-10,-0.4,20,-10,-1.7,20,-10,-2.2,20.4,-10],
// 3 16 -2.2 20.4 -10 -2.8 20.7 -10 20 24 -10
  [3,16,-2.2,20.4,-10,-2.8,20.7,-10,20,24,-10],
// 4 16 20 24 -10 -2.8 20.7 -10 -5.6 21.6 -10 -6.1 21.9 -10
  [4,16,20,24,-10,-2.8,20.7,-10,-5.6,21.6,-10,-6.1,21.9,-10],
// 4 16 -20 24 -10 20 24 -10 -6.1 21.9 -10 -6.7 21.9 -10
  [4,16,-20,24,-10,20,24,-10,-6.1,21.9,-10,-6.7,21.9,-10],
// 3 16 -7.3 21.6 -10 -20 24 -10 -6.7 21.9 -10
  [3,16,-7.3,21.6,-10,-20,24,-10,-6.7,21.9,-10],
// 4 16 -20 24 -10 -7.3 21.6 -10 -7.7 21 -10 -8.3 20.2 -10
  [4,16,-20,24,-10,-7.3,21.6,-10,-7.7,21,-10,-8.3,20.2,-10],
// 4 16 -20 24 -10 -8.3 20.2 -10 -9.1 19.6 -10 -10 19.2 -10
  [4,16,-20,24,-10,-8.3,20.2,-10,-9.1,19.6,-10,-10,19.2,-10],
// 3 16 -10.4 18.7 -10 -20 24 -10 -10 19.2 -10
  [3,16,-10.4,18.7,-10,-20,24,-10,-10,19.2,-10],
// 3 16 -10.5 18.1 -10 -20 24 -10 -10.4 18.7 -10
  [3,16,-10.5,18.1,-10,-20,24,-10,-10.4,18.7,-10],
// 4 16 -20 24 -10 -10.5 18.1 -10 -10.4 17.5 -10 -20 0 -10
  [4,16,-20,24,-10,-10.5,18.1,-10,-10.4,17.5,-10,-20,0,-10],
// 4 16 -20 0 -10 -10.4 17.5 -10 -10.1 15.2 -10 -10.1 14.5 -10
  [4,16,-20,0,-10,-10.4,17.5,-10,-10.1,15.2,-10,-10.1,14.5,-10],
// 3 16 -20 0 -10 -10.1 14.5 -10 -9.9 13.8 -10
  [3,16,-20,0,-10,-10.1,14.5,-10,-9.9,13.8,-10],
// 4 16 -20 0 -10 -9.9 13.8 -10 -9.5 13.3 -10 -9 12 -10
  [4,16,-20,0,-10,-9.9,13.8,-10,-9.5,13.3,-10,-9,12,-10],
// 4 16 -9 12 -10 -9.5 13.3 -10 -8.9 13.1 -10 -8 12.2 -10
  [4,16,-9,12,-10,-9.5,13.3,-10,-8.9,13.1,-10,-8,12.2,-10],
// 4 16 -8 12.2 -10 -8.9 13.1 -10 -8.3 13.3 -10 -7.3 12.7 -10
  [4,16,-8,12.2,-10,-8.9,13.1,-10,-8.3,13.3,-10,-7.3,12.7,-10],
// 4 16 -7.3 12.7 -10 -8.3 13.3 -10 -7.9 14 -10 -6.8 13.4 -10
  [4,16,-7.3,12.7,-10,-8.3,13.3,-10,-7.9,14,-10,-6.8,13.4,-10],
// 4 16 -7.3 12.7 -10 -6.8 13.4 -10 -6.2 12.9 -10 -6.6 12.1 -10
  [4,16,-7.3,12.7,-10,-6.8,13.4,-10,-6.2,12.9,-10,-6.6,12.1,-10],
// 4 16 -5.9 11.8 -10 -6.6 12.1 -10 -6.2 12.9 -10 -5.4 12.7 -10
  [4,16,-5.9,11.8,-10,-6.6,12.1,-10,-6.2,12.9,-10,-5.4,12.7,-10],
// 4 16 -5.1 11.7 -10 -5.9 11.8 -10 -5.4 12.7 -10 -4.8 13.1 -10
  [4,16,-5.1,11.7,-10,-5.9,11.8,-10,-5.4,12.7,-10,-4.8,13.1,-10],
// 4 16 -4.2 12 -10 -5.1 11.7 -10 -4.8 13.1 -10 -3.6 12.7 -10
  [4,16,-4.2,12,-10,-5.1,11.7,-10,-4.8,13.1,-10,-3.6,12.7,-10],
// 4 16 -3.6 12.7 -10 -4.8 13.1 -10 -4.5 13.8 -10 -3.3 13.6 -10
  [4,16,-3.6,12.7,-10,-4.8,13.1,-10,-4.5,13.8,-10,-3.3,13.6,-10],
// 4 16 -3.3 13.6 -10 -4.5 13.8 -10 -4.6 14.7 -10 -3.2 14.2 -10
  [4,16,-3.3,13.6,-10,-4.5,13.8,-10,-4.6,14.7,-10,-3.2,14.2,-10],
// 4 16 -3.2 14.2 -10 -4.6 14.7 -10 -3.8 15.2 -10 -2.9 15.1 -10
  [4,16,-3.2,14.2,-10,-4.6,14.7,-10,-3.8,15.2,-10,-2.9,15.1,-10],
// 4 16 -2.3 14.1 -10 -3.2 14.2 -10 -2.9 15.1 -10 -2 15.3 -10
  [4,16,-2.3,14.1,-10,-3.2,14.2,-10,-2.9,15.1,-10,-2,15.3,-10],
// 4 16 -1.4 14.3 -10 -2.3 14.1 -10 -2 15.3 -10 -0.6 15.1 -10
  [4,16,-1.4,14.3,-10,-2.3,14.1,-10,-2,15.3,-10,-0.6,15.1,-10],
// 4 16 -0.6 15.1 -10 -2 15.3 -10 -1.7 15.8 -10 -0.3 16 -10
  [4,16,-0.6,15.1,-10,-2,15.3,-10,-1.7,15.8,-10,-0.3,16,-10],
// 4 16 -0.3 16 -10 -1.7 15.8 -10 -1.7 16.5 -10 -0.4 16.8 -10
  [4,16,-0.3,16,-10,-1.7,15.8,-10,-1.7,16.5,-10,-0.4,16.8,-10],
// 4 16 -1 17.5 -10 -0.4 16.8 -10 -1.7 16.5 -10 -2.2 17.2 -10
  [4,16,-1,17.5,-10,-0.4,16.8,-10,-1.7,16.5,-10,-2.2,17.2,-10],
// 4 16 -1 17.5 -10 -2.2 17.2 -10 -1.9 18.4 -10 -1.5 18.9 -10
  [4,16,-1,17.5,-10,-2.2,17.2,-10,-1.9,18.4,-10,-1.5,18.9,-10],
// 4 16 -0.4 18.4 -10 -1 17.5 -10 -1.5 18.9 -10 -1.5 19.4 -10
  [4,16,-0.4,18.4,-10,-1,17.5,-10,-1.5,18.9,-10,-1.5,19.4,-10],
// 4 16 -0.3 19.3 -10 -0.4 18.4 -10 -1.5 19.4 -10 -1.7 20 -10
  [4,16,-0.3,19.3,-10,-0.4,18.4,-10,-1.5,19.4,-10,-1.7,20,-10],
// 3 16 -0.3 19.3 -10 -1.7 20 -10 -0.4 20 -10
  [3,16,-0.3,19.3,-10,-1.7,20,-10,-0.4,20,-10],
// 4 16 -2.7 18.2 -10 -1.9 18.4 -10 -2.2 17.2 -10 -3 17.8 -10
  [4,16,-2.7,18.2,-10,-1.9,18.4,-10,-2.2,17.2,-10,-3,17.8,-10],
// 4 16 -3.5 18.3 -10 -2.7 18.2 -10 -3 17.8 -10 -3.9 18.1 -10
  [4,16,-3.5,18.3,-10,-2.7,18.2,-10,-3,17.8,-10,-3.9,18.1,-10],
// 4 16 -4 18.6 -10 -3.5 18.3 -10 -3.9 18.1 -10 -4.8 17.9 -10
  [4,16,-4,18.6,-10,-3.5,18.3,-10,-3.9,18.1,-10,-4.8,17.9,-10],
// 4 16 -4.4 19 -10 -4 18.6 -10 -4.8 17.9 -10 -5.5 18.5 -10
  [4,16,-4.4,19,-10,-4,18.6,-10,-4.8,17.9,-10,-5.5,18.5,-10],
// 4 16 -4.4 19 -10 -5.5 18.5 -10 -5.2 19.5 -10 -4.5 19.5 -10
  [4,16,-4.4,19,-10,-5.5,18.5,-10,-5.2,19.5,-10,-4.5,19.5,-10],
// 4 16 -4.5 20 -10 -4.5 19.5 -10 -5.2 19.5 -10 -5.2 20.8 -10
  [4,16,-4.5,20,-10,-4.5,19.5,-10,-5.2,19.5,-10,-5.2,20.8,-10],
// 4 16 -4.1 20.5 -10 -4.5 20 -10 -5.2 20.8 -10 -5.6 21.6 -10
  [4,16,-4.1,20.5,-10,-4.5,20,-10,-5.2,20.8,-10,-5.6,21.6,-10],
// 3 16 -4.1 20.5 -10 -5.6 21.6 -10 -3.6 20.7 -10
  [3,16,-4.1,20.5,-10,-5.6,21.6,-10,-3.6,20.7,-10],
// 3 16 -2.8 20.7 -10 -3.6 20.7 -10 -5.6 21.6 -10
  [3,16,-2.8,20.7,-10,-3.6,20.7,-10,-5.6,21.6,-10],
// 4 16 -5.5 18.5 -10 -4.8 17.9 -10 -5.2 17.5 -10 -6 17.7 -10
  [4,16,-5.5,18.5,-10,-4.8,17.9,-10,-5.2,17.5,-10,-6,17.7,-10],
// 4 16 -6 17.7 -10 -5.2 17.5 -10 -5.2 16.8 -10 -6.4 16.5 -10
  [4,16,-6,17.7,-10,-5.2,17.5,-10,-5.2,16.8,-10,-6.4,16.5,-10],
// 4 16 -5.8 16.2 -10 -6.4 16.5 -10 -5.2 16.8 -10 -5 16.2 -10
  [4,16,-5.8,16.2,-10,-6.4,16.5,-10,-5.2,16.8,-10,-5,16.2,-10],
// 4 16 -5.1 15.5 -10 -5.8 16.2 -10 -5 16.2 -10 -4.5 15.6 -10
  [4,16,-5.1,15.5,-10,-5.8,16.2,-10,-5,16.2,-10,-4.5,15.6,-10],
// 4 16 -4.6 14.7 -10 -5.1 15.5 -10 -4.5 15.6 -10 -3.8 15.2 -10
  [4,16,-4.6,14.7,-10,-5.1,15.5,-10,-4.5,15.6,-10,-3.8,15.2,-10],
// 4 16 -6.9 17.1 -10 -6 17.7 -10 -6.4 16.5 -10 -7.2 16.1 -10
  [4,16,-6.9,17.1,-10,-6,17.7,-10,-6.4,16.5,-10,-7.2,16.1,-10],
// 4 16 -8.2 16.7 -10 -6.9 17.1 -10 -7.2 16.1 -10 -8.2 15.6 -10
  [4,16,-8.2,16.7,-10,-6.9,17.1,-10,-7.2,16.1,-10,-8.2,15.6,-10],
// 4 16 -8.2 15.6 -10 -7.2 16.1 -10 -7.4 15.5 -10 -7.9 14.8 -10
  [4,16,-8.2,15.6,-10,-7.2,16.1,-10,-7.4,15.5,-10,-7.9,14.8,-10],
// 4 16 -7.9 14.8 -10 -7.4 15.5 -10 -7.4 14.8 -10 -7.9 14 -10
  [4,16,-7.9,14.8,-10,-7.4,15.5,-10,-7.4,14.8,-10,-7.9,14,-10],
// 3 16 -7.2 14 -10 -7.9 14 -10 -7.4 14.8 -10
  [3,16,-7.2,14,-10,-7.9,14,-10,-7.4,14.8,-10],
// 3 16 -6.8 13.4 -10 -7.9 14 -10 -7.2 14 -10
  [3,16,-6.8,13.4,-10,-7.9,14,-10,-7.2,14,-10],
// 4 16 -8.2 16.7 -10 -8.2 15.6 -10 -8.7 16.1 -10 -9.3 16.8 -10
  [4,16,-8.2,16.7,-10,-8.2,15.6,-10,-8.7,16.1,-10,-9.3,16.8,-10],
// 4 16 -9.3 16.8 -10 -8.7 16.1 -10 -9.4 16.1 -10 -10 17.1 -10
  [4,16,-9.3,16.8,-10,-8.7,16.1,-10,-9.4,16.1,-10,-10,17.1,-10],
// 4 16 -10 17.1 -10 -9.4 16.1 -10 -9.9 15.7 -10 -10.4 17.5 -10
  [4,16,-10,17.1,-10,-9.4,16.1,-10,-9.9,15.7,-10,-10.4,17.5,-10],
// 3 16 -10.1 15.2 -10 -10.4 17.5 -10 -9.9 15.7 -10
  [3,16,-10.1,15.2,-10,-10.4,17.5,-10,-9.9,15.7,-10],
// 3 16 -20 0 -10 -9 12 -10 -9 8 -10
  [3,16,-20,0,-10,-9,12,-10,-9,8,-10],
// 4 16 -20 0 -10 -9 8 -10 -3 8 -10 -3 2 -10
  [4,16,-20,0,-10,-9,8,-10,-3,8,-10,-3,2,-10],
];
module ldraw_lib__3004pf0(step=0, col=false, unit=2/5, alt=false, line=0.2, solid=!$preview)
    makepoly(ldraw_lib__3004pf0(), step=step, col=col, unit=unit, alt=alt, line=line, solid=solid);
ldraw_lib__3004pf0(line=0.2);
